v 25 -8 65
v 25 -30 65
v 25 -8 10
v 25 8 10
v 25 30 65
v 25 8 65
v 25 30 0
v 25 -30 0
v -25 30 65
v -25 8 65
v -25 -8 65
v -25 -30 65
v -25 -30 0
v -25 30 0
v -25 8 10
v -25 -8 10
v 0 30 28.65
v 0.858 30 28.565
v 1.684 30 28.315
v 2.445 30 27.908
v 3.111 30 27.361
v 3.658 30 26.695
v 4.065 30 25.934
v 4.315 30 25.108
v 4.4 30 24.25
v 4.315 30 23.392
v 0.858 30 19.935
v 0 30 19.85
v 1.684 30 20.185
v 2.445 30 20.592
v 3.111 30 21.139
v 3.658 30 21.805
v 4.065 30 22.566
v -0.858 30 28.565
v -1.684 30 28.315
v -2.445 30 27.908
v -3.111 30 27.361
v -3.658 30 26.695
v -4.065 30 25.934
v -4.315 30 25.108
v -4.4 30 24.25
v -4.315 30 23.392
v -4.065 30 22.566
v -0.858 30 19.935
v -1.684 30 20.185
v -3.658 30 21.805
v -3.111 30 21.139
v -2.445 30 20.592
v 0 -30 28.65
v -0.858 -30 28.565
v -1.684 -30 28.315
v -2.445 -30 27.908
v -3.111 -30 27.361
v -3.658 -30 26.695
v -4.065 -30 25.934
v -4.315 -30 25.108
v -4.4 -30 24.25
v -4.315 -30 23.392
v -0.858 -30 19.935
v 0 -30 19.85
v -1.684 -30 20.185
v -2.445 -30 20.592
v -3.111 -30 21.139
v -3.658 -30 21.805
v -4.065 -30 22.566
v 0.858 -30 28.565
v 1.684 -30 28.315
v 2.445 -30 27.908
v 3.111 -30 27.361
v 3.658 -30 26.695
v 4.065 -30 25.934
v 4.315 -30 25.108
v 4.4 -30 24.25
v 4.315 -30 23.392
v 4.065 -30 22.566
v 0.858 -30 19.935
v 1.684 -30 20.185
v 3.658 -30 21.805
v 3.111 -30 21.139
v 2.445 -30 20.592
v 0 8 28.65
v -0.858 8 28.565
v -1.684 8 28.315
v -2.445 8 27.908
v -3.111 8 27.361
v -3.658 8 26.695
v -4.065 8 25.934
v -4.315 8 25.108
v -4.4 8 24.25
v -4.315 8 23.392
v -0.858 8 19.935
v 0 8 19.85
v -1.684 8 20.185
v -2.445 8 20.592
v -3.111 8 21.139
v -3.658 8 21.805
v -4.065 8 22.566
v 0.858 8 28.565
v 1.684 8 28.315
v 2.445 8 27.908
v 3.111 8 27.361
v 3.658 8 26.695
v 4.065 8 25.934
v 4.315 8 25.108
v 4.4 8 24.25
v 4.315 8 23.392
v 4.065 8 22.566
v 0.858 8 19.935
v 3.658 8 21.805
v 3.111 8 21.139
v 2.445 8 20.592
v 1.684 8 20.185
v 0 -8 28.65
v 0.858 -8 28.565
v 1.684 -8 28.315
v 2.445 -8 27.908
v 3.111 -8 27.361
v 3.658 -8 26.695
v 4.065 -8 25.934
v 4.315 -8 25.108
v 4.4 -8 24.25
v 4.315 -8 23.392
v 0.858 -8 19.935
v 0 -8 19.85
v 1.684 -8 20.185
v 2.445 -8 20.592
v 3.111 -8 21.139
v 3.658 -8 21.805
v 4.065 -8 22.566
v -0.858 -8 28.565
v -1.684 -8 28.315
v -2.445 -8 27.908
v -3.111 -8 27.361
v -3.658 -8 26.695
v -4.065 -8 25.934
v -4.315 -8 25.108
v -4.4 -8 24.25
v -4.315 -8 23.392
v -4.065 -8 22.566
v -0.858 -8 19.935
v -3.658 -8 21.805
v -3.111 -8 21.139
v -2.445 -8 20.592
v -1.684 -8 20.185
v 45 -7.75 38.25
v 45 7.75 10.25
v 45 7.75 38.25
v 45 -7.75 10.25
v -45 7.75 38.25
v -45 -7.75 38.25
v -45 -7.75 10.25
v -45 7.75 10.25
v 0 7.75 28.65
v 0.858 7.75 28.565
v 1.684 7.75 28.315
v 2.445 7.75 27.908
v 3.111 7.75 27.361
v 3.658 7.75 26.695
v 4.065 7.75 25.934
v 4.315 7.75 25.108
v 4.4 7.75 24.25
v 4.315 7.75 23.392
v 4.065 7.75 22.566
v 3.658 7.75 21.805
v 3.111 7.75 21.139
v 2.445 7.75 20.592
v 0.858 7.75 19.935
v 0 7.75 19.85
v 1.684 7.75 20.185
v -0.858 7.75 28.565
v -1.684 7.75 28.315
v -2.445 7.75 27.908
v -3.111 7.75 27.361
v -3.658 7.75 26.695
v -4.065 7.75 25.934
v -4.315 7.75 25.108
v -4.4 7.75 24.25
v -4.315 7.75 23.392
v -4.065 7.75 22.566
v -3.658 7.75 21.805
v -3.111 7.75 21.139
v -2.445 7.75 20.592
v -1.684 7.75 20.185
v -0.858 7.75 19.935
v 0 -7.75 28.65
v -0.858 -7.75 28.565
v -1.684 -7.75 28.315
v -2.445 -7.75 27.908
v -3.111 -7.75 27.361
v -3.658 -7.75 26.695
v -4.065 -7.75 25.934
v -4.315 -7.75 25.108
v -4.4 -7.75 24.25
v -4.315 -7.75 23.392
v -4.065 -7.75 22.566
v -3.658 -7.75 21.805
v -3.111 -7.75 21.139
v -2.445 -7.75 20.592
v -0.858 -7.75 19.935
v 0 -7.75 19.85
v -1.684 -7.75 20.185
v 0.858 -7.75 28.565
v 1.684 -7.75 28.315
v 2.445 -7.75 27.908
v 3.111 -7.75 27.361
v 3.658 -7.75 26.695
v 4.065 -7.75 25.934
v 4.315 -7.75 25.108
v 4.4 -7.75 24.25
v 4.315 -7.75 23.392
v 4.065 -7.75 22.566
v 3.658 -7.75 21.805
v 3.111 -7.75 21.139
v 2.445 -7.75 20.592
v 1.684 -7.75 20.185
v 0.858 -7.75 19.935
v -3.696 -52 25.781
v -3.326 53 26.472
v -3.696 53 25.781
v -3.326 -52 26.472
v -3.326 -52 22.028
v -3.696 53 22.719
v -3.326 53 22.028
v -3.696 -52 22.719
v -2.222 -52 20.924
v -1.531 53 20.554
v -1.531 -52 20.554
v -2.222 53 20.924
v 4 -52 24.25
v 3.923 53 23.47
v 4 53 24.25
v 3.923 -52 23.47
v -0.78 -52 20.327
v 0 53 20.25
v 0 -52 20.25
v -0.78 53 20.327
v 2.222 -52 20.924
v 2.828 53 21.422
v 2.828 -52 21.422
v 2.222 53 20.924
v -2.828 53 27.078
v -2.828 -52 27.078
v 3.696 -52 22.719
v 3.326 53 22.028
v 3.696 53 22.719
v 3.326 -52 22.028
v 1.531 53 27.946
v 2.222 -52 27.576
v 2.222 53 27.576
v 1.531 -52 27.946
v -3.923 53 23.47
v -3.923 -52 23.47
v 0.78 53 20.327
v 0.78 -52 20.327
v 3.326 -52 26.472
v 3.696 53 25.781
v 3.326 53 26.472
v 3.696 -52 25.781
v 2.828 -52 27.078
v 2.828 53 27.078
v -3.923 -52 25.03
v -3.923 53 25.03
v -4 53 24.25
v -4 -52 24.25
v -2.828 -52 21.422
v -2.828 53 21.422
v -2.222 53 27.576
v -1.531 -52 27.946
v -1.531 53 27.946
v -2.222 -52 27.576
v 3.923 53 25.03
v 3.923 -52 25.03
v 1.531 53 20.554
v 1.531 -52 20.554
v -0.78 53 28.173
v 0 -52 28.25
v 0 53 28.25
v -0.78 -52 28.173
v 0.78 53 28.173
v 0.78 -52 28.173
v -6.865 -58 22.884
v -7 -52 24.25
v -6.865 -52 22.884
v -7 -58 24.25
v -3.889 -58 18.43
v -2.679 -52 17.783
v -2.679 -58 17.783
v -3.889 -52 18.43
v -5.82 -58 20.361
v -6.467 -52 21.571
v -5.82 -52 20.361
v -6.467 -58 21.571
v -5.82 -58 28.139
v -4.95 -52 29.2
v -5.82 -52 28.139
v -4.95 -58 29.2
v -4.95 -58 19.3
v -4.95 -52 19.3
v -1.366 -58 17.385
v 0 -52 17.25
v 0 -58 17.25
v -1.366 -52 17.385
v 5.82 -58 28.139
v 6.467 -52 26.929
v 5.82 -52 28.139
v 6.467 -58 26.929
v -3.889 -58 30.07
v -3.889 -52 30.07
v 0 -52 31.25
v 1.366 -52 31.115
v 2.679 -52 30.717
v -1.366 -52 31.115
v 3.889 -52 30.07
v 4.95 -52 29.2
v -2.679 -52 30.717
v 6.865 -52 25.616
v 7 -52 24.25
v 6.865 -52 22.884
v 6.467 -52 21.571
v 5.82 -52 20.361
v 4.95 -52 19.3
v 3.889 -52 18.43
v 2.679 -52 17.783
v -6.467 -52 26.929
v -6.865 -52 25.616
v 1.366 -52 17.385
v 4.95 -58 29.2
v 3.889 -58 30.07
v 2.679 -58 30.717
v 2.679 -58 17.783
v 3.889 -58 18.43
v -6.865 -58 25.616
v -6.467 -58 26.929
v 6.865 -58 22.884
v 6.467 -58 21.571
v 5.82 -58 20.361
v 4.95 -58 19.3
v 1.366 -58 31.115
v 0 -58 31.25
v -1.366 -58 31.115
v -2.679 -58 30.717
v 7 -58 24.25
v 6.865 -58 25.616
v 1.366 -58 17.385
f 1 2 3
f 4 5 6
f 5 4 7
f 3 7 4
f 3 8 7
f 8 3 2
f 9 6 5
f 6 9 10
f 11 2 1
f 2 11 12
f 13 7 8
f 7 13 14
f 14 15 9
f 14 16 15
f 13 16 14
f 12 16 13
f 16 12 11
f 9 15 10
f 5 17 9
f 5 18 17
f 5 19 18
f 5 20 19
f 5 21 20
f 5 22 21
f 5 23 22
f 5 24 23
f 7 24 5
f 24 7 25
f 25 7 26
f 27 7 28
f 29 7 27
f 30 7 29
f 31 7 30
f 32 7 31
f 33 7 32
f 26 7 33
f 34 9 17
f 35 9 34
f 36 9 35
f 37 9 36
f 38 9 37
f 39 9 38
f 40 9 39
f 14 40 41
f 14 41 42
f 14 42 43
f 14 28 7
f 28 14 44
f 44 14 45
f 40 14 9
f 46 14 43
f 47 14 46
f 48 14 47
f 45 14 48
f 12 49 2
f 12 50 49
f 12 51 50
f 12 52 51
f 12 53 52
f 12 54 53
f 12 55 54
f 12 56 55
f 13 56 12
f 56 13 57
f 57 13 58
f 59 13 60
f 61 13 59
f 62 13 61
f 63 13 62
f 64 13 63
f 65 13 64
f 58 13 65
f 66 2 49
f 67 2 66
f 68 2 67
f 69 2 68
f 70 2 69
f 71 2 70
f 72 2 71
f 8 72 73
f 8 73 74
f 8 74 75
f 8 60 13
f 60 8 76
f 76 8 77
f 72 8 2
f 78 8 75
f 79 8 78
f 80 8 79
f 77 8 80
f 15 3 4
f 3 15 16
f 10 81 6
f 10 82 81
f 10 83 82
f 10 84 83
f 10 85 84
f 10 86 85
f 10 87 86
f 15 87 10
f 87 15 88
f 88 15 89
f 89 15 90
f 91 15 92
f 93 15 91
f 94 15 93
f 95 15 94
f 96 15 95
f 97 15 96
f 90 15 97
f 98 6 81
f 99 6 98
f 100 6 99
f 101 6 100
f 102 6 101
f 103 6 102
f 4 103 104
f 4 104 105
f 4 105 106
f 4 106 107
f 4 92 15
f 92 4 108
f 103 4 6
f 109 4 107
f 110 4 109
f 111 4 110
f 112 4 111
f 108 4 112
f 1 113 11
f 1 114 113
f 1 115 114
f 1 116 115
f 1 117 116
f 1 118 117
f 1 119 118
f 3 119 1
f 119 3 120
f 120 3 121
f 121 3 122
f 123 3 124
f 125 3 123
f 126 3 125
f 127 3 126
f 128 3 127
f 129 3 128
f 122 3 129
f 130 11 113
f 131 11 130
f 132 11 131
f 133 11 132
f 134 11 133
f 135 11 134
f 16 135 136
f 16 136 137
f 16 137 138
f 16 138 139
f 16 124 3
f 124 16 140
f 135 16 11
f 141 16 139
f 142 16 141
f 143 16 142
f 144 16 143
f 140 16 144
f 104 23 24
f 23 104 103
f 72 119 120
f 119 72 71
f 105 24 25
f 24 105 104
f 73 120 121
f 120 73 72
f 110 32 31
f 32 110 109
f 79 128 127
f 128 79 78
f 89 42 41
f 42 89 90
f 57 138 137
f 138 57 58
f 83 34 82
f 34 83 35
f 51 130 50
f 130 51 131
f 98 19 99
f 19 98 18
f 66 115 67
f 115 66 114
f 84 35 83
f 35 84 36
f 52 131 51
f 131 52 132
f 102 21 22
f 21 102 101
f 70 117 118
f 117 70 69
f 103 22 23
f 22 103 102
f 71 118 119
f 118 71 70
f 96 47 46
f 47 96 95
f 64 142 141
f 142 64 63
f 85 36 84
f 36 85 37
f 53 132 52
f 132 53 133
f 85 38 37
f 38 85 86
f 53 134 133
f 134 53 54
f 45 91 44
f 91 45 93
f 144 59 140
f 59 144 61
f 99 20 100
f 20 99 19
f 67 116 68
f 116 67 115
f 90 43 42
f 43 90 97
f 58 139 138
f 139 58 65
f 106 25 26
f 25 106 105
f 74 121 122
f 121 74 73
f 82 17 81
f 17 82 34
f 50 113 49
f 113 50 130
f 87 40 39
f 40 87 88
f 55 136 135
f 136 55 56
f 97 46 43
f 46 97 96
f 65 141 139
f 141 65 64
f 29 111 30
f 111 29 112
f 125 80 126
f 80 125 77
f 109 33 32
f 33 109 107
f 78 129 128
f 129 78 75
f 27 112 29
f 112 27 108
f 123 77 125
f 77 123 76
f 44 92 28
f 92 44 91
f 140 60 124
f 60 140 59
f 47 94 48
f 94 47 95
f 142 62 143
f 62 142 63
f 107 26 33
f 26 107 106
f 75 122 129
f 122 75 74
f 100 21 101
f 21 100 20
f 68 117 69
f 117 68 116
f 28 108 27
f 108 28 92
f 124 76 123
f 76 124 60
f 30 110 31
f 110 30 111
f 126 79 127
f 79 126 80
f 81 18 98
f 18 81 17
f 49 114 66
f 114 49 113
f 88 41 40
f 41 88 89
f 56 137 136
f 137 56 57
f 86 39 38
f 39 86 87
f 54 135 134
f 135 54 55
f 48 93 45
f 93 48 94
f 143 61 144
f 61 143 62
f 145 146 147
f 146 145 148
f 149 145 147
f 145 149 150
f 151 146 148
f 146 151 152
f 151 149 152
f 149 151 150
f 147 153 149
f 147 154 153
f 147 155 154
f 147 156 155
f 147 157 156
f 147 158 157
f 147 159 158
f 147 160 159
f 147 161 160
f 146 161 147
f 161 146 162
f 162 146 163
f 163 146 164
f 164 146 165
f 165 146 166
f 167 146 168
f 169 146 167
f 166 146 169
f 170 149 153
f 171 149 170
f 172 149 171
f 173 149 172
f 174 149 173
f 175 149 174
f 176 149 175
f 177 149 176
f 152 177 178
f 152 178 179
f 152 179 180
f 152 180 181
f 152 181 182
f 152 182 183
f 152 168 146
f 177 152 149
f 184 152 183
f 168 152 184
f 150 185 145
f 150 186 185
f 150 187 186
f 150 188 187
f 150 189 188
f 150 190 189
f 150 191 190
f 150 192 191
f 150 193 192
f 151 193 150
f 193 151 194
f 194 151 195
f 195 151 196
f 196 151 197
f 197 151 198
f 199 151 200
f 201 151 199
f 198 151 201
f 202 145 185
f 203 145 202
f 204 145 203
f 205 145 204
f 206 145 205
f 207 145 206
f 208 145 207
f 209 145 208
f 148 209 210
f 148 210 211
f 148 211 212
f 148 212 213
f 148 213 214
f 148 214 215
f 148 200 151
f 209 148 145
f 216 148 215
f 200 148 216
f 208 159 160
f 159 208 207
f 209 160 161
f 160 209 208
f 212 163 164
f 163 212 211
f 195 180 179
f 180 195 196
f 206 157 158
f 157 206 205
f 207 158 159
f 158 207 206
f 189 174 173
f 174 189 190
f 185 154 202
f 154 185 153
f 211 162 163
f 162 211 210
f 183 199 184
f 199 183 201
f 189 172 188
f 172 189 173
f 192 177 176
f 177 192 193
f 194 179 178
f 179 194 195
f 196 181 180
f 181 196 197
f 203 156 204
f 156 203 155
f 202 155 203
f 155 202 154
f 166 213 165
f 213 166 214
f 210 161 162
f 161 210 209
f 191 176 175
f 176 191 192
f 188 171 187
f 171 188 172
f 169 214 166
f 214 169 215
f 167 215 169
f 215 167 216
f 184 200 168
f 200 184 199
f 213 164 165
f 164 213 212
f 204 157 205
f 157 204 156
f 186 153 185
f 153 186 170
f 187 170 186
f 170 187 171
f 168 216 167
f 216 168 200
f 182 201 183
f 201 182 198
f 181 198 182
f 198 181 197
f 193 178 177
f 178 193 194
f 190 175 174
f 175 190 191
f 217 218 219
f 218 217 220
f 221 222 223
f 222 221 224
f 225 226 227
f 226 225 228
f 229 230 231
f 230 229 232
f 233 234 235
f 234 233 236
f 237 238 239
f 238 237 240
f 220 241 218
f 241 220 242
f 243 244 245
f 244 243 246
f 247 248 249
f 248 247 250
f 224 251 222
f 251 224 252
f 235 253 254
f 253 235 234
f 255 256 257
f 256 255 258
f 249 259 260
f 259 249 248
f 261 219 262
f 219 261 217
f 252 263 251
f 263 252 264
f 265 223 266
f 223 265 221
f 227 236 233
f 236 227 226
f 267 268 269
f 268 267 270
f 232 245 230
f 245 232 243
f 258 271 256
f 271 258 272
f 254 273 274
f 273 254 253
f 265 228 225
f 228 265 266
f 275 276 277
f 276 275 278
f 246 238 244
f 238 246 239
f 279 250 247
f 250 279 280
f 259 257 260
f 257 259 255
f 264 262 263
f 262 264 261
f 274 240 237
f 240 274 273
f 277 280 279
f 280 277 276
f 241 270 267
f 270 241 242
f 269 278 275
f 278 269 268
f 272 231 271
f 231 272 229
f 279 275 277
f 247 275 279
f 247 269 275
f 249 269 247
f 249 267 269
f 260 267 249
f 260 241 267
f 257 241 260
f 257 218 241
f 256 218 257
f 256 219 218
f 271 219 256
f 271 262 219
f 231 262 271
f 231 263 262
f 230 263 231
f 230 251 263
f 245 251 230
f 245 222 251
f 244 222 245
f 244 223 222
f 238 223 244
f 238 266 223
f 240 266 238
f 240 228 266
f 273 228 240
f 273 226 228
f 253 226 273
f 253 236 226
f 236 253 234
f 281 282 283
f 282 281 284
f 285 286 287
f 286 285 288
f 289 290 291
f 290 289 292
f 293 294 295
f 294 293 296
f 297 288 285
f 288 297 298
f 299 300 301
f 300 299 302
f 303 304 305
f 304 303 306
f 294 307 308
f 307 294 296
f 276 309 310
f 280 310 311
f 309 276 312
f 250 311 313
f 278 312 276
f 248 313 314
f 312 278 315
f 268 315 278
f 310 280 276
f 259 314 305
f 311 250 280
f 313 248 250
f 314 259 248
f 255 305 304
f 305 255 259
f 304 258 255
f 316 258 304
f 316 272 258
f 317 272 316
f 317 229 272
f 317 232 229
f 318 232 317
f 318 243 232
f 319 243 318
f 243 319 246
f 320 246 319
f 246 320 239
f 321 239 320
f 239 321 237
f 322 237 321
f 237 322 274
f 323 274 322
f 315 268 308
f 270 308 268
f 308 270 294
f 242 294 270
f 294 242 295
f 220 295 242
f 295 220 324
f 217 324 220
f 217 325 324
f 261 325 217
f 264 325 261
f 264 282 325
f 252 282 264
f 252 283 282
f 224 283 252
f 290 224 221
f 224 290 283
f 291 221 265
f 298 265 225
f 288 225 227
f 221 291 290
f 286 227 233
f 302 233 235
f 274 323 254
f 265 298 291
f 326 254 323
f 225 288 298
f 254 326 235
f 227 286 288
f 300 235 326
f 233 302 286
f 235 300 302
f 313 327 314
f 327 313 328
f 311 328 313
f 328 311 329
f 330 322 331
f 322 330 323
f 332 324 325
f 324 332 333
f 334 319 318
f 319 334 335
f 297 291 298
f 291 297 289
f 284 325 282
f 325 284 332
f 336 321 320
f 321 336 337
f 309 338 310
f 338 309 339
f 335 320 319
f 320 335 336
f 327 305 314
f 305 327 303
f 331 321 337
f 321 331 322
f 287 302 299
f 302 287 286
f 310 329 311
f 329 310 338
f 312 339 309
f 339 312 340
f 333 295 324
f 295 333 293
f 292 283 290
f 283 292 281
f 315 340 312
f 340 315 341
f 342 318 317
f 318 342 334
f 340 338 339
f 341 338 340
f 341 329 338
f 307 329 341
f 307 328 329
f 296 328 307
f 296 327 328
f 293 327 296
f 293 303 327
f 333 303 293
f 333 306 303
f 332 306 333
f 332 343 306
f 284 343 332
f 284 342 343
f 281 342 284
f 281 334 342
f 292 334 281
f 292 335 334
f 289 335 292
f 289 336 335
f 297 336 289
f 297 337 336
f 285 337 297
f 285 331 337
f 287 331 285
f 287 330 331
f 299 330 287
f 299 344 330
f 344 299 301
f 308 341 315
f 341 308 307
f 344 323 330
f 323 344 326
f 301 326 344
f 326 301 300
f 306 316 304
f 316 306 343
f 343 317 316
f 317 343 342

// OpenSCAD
$fn = 32;

// ------------------------------------------------------------------------
// Clevis joint: 50 mm clevis, pin d8
// Every part is its own module, assembly() places them once.
// ------------------------------------------------------------------------

// --- part 1 ---
module clevis() {
  difference() {
    translate([-25, -30, 0]) cube([50, 60, 65]);
    translate([-26, -8, 10]) cube([52, 16, 56]);
    translate([0, 0, 24.25]) rotate([90, 0, 0]) cylinder(h = 62, d = 8.8, center = true);
  }
}

// --- part 2 ---
module eye() {
  difference() {
    translate([-45, -7.75, 0]) cube([90, 15.5, 28]);
    translate([0, 0, 14]) rotate([90, 0, 0]) cylinder(h = 17.5, d = 8.8, center = true);
  }
}

// --- part 3 ---
module pin() {
  rotate([0, 90, 0]) cylinder(h = 106, d = 8, center = true);
  translate([-58, 0, 0]) rotate([0, 90, 0]) cylinder(h = 6, d = 14);
}

// --- assembly ---
module assembly() {
  translate([0, 0, 0]) rotate([0, 0, 0]) clevis();
  translate([0, 0, 10.25]) rotate([0, 0, 0]) eye();
  translate([0, 0, 24.25]) rotate([0, 0, 90]) pin();
}

assembly();
